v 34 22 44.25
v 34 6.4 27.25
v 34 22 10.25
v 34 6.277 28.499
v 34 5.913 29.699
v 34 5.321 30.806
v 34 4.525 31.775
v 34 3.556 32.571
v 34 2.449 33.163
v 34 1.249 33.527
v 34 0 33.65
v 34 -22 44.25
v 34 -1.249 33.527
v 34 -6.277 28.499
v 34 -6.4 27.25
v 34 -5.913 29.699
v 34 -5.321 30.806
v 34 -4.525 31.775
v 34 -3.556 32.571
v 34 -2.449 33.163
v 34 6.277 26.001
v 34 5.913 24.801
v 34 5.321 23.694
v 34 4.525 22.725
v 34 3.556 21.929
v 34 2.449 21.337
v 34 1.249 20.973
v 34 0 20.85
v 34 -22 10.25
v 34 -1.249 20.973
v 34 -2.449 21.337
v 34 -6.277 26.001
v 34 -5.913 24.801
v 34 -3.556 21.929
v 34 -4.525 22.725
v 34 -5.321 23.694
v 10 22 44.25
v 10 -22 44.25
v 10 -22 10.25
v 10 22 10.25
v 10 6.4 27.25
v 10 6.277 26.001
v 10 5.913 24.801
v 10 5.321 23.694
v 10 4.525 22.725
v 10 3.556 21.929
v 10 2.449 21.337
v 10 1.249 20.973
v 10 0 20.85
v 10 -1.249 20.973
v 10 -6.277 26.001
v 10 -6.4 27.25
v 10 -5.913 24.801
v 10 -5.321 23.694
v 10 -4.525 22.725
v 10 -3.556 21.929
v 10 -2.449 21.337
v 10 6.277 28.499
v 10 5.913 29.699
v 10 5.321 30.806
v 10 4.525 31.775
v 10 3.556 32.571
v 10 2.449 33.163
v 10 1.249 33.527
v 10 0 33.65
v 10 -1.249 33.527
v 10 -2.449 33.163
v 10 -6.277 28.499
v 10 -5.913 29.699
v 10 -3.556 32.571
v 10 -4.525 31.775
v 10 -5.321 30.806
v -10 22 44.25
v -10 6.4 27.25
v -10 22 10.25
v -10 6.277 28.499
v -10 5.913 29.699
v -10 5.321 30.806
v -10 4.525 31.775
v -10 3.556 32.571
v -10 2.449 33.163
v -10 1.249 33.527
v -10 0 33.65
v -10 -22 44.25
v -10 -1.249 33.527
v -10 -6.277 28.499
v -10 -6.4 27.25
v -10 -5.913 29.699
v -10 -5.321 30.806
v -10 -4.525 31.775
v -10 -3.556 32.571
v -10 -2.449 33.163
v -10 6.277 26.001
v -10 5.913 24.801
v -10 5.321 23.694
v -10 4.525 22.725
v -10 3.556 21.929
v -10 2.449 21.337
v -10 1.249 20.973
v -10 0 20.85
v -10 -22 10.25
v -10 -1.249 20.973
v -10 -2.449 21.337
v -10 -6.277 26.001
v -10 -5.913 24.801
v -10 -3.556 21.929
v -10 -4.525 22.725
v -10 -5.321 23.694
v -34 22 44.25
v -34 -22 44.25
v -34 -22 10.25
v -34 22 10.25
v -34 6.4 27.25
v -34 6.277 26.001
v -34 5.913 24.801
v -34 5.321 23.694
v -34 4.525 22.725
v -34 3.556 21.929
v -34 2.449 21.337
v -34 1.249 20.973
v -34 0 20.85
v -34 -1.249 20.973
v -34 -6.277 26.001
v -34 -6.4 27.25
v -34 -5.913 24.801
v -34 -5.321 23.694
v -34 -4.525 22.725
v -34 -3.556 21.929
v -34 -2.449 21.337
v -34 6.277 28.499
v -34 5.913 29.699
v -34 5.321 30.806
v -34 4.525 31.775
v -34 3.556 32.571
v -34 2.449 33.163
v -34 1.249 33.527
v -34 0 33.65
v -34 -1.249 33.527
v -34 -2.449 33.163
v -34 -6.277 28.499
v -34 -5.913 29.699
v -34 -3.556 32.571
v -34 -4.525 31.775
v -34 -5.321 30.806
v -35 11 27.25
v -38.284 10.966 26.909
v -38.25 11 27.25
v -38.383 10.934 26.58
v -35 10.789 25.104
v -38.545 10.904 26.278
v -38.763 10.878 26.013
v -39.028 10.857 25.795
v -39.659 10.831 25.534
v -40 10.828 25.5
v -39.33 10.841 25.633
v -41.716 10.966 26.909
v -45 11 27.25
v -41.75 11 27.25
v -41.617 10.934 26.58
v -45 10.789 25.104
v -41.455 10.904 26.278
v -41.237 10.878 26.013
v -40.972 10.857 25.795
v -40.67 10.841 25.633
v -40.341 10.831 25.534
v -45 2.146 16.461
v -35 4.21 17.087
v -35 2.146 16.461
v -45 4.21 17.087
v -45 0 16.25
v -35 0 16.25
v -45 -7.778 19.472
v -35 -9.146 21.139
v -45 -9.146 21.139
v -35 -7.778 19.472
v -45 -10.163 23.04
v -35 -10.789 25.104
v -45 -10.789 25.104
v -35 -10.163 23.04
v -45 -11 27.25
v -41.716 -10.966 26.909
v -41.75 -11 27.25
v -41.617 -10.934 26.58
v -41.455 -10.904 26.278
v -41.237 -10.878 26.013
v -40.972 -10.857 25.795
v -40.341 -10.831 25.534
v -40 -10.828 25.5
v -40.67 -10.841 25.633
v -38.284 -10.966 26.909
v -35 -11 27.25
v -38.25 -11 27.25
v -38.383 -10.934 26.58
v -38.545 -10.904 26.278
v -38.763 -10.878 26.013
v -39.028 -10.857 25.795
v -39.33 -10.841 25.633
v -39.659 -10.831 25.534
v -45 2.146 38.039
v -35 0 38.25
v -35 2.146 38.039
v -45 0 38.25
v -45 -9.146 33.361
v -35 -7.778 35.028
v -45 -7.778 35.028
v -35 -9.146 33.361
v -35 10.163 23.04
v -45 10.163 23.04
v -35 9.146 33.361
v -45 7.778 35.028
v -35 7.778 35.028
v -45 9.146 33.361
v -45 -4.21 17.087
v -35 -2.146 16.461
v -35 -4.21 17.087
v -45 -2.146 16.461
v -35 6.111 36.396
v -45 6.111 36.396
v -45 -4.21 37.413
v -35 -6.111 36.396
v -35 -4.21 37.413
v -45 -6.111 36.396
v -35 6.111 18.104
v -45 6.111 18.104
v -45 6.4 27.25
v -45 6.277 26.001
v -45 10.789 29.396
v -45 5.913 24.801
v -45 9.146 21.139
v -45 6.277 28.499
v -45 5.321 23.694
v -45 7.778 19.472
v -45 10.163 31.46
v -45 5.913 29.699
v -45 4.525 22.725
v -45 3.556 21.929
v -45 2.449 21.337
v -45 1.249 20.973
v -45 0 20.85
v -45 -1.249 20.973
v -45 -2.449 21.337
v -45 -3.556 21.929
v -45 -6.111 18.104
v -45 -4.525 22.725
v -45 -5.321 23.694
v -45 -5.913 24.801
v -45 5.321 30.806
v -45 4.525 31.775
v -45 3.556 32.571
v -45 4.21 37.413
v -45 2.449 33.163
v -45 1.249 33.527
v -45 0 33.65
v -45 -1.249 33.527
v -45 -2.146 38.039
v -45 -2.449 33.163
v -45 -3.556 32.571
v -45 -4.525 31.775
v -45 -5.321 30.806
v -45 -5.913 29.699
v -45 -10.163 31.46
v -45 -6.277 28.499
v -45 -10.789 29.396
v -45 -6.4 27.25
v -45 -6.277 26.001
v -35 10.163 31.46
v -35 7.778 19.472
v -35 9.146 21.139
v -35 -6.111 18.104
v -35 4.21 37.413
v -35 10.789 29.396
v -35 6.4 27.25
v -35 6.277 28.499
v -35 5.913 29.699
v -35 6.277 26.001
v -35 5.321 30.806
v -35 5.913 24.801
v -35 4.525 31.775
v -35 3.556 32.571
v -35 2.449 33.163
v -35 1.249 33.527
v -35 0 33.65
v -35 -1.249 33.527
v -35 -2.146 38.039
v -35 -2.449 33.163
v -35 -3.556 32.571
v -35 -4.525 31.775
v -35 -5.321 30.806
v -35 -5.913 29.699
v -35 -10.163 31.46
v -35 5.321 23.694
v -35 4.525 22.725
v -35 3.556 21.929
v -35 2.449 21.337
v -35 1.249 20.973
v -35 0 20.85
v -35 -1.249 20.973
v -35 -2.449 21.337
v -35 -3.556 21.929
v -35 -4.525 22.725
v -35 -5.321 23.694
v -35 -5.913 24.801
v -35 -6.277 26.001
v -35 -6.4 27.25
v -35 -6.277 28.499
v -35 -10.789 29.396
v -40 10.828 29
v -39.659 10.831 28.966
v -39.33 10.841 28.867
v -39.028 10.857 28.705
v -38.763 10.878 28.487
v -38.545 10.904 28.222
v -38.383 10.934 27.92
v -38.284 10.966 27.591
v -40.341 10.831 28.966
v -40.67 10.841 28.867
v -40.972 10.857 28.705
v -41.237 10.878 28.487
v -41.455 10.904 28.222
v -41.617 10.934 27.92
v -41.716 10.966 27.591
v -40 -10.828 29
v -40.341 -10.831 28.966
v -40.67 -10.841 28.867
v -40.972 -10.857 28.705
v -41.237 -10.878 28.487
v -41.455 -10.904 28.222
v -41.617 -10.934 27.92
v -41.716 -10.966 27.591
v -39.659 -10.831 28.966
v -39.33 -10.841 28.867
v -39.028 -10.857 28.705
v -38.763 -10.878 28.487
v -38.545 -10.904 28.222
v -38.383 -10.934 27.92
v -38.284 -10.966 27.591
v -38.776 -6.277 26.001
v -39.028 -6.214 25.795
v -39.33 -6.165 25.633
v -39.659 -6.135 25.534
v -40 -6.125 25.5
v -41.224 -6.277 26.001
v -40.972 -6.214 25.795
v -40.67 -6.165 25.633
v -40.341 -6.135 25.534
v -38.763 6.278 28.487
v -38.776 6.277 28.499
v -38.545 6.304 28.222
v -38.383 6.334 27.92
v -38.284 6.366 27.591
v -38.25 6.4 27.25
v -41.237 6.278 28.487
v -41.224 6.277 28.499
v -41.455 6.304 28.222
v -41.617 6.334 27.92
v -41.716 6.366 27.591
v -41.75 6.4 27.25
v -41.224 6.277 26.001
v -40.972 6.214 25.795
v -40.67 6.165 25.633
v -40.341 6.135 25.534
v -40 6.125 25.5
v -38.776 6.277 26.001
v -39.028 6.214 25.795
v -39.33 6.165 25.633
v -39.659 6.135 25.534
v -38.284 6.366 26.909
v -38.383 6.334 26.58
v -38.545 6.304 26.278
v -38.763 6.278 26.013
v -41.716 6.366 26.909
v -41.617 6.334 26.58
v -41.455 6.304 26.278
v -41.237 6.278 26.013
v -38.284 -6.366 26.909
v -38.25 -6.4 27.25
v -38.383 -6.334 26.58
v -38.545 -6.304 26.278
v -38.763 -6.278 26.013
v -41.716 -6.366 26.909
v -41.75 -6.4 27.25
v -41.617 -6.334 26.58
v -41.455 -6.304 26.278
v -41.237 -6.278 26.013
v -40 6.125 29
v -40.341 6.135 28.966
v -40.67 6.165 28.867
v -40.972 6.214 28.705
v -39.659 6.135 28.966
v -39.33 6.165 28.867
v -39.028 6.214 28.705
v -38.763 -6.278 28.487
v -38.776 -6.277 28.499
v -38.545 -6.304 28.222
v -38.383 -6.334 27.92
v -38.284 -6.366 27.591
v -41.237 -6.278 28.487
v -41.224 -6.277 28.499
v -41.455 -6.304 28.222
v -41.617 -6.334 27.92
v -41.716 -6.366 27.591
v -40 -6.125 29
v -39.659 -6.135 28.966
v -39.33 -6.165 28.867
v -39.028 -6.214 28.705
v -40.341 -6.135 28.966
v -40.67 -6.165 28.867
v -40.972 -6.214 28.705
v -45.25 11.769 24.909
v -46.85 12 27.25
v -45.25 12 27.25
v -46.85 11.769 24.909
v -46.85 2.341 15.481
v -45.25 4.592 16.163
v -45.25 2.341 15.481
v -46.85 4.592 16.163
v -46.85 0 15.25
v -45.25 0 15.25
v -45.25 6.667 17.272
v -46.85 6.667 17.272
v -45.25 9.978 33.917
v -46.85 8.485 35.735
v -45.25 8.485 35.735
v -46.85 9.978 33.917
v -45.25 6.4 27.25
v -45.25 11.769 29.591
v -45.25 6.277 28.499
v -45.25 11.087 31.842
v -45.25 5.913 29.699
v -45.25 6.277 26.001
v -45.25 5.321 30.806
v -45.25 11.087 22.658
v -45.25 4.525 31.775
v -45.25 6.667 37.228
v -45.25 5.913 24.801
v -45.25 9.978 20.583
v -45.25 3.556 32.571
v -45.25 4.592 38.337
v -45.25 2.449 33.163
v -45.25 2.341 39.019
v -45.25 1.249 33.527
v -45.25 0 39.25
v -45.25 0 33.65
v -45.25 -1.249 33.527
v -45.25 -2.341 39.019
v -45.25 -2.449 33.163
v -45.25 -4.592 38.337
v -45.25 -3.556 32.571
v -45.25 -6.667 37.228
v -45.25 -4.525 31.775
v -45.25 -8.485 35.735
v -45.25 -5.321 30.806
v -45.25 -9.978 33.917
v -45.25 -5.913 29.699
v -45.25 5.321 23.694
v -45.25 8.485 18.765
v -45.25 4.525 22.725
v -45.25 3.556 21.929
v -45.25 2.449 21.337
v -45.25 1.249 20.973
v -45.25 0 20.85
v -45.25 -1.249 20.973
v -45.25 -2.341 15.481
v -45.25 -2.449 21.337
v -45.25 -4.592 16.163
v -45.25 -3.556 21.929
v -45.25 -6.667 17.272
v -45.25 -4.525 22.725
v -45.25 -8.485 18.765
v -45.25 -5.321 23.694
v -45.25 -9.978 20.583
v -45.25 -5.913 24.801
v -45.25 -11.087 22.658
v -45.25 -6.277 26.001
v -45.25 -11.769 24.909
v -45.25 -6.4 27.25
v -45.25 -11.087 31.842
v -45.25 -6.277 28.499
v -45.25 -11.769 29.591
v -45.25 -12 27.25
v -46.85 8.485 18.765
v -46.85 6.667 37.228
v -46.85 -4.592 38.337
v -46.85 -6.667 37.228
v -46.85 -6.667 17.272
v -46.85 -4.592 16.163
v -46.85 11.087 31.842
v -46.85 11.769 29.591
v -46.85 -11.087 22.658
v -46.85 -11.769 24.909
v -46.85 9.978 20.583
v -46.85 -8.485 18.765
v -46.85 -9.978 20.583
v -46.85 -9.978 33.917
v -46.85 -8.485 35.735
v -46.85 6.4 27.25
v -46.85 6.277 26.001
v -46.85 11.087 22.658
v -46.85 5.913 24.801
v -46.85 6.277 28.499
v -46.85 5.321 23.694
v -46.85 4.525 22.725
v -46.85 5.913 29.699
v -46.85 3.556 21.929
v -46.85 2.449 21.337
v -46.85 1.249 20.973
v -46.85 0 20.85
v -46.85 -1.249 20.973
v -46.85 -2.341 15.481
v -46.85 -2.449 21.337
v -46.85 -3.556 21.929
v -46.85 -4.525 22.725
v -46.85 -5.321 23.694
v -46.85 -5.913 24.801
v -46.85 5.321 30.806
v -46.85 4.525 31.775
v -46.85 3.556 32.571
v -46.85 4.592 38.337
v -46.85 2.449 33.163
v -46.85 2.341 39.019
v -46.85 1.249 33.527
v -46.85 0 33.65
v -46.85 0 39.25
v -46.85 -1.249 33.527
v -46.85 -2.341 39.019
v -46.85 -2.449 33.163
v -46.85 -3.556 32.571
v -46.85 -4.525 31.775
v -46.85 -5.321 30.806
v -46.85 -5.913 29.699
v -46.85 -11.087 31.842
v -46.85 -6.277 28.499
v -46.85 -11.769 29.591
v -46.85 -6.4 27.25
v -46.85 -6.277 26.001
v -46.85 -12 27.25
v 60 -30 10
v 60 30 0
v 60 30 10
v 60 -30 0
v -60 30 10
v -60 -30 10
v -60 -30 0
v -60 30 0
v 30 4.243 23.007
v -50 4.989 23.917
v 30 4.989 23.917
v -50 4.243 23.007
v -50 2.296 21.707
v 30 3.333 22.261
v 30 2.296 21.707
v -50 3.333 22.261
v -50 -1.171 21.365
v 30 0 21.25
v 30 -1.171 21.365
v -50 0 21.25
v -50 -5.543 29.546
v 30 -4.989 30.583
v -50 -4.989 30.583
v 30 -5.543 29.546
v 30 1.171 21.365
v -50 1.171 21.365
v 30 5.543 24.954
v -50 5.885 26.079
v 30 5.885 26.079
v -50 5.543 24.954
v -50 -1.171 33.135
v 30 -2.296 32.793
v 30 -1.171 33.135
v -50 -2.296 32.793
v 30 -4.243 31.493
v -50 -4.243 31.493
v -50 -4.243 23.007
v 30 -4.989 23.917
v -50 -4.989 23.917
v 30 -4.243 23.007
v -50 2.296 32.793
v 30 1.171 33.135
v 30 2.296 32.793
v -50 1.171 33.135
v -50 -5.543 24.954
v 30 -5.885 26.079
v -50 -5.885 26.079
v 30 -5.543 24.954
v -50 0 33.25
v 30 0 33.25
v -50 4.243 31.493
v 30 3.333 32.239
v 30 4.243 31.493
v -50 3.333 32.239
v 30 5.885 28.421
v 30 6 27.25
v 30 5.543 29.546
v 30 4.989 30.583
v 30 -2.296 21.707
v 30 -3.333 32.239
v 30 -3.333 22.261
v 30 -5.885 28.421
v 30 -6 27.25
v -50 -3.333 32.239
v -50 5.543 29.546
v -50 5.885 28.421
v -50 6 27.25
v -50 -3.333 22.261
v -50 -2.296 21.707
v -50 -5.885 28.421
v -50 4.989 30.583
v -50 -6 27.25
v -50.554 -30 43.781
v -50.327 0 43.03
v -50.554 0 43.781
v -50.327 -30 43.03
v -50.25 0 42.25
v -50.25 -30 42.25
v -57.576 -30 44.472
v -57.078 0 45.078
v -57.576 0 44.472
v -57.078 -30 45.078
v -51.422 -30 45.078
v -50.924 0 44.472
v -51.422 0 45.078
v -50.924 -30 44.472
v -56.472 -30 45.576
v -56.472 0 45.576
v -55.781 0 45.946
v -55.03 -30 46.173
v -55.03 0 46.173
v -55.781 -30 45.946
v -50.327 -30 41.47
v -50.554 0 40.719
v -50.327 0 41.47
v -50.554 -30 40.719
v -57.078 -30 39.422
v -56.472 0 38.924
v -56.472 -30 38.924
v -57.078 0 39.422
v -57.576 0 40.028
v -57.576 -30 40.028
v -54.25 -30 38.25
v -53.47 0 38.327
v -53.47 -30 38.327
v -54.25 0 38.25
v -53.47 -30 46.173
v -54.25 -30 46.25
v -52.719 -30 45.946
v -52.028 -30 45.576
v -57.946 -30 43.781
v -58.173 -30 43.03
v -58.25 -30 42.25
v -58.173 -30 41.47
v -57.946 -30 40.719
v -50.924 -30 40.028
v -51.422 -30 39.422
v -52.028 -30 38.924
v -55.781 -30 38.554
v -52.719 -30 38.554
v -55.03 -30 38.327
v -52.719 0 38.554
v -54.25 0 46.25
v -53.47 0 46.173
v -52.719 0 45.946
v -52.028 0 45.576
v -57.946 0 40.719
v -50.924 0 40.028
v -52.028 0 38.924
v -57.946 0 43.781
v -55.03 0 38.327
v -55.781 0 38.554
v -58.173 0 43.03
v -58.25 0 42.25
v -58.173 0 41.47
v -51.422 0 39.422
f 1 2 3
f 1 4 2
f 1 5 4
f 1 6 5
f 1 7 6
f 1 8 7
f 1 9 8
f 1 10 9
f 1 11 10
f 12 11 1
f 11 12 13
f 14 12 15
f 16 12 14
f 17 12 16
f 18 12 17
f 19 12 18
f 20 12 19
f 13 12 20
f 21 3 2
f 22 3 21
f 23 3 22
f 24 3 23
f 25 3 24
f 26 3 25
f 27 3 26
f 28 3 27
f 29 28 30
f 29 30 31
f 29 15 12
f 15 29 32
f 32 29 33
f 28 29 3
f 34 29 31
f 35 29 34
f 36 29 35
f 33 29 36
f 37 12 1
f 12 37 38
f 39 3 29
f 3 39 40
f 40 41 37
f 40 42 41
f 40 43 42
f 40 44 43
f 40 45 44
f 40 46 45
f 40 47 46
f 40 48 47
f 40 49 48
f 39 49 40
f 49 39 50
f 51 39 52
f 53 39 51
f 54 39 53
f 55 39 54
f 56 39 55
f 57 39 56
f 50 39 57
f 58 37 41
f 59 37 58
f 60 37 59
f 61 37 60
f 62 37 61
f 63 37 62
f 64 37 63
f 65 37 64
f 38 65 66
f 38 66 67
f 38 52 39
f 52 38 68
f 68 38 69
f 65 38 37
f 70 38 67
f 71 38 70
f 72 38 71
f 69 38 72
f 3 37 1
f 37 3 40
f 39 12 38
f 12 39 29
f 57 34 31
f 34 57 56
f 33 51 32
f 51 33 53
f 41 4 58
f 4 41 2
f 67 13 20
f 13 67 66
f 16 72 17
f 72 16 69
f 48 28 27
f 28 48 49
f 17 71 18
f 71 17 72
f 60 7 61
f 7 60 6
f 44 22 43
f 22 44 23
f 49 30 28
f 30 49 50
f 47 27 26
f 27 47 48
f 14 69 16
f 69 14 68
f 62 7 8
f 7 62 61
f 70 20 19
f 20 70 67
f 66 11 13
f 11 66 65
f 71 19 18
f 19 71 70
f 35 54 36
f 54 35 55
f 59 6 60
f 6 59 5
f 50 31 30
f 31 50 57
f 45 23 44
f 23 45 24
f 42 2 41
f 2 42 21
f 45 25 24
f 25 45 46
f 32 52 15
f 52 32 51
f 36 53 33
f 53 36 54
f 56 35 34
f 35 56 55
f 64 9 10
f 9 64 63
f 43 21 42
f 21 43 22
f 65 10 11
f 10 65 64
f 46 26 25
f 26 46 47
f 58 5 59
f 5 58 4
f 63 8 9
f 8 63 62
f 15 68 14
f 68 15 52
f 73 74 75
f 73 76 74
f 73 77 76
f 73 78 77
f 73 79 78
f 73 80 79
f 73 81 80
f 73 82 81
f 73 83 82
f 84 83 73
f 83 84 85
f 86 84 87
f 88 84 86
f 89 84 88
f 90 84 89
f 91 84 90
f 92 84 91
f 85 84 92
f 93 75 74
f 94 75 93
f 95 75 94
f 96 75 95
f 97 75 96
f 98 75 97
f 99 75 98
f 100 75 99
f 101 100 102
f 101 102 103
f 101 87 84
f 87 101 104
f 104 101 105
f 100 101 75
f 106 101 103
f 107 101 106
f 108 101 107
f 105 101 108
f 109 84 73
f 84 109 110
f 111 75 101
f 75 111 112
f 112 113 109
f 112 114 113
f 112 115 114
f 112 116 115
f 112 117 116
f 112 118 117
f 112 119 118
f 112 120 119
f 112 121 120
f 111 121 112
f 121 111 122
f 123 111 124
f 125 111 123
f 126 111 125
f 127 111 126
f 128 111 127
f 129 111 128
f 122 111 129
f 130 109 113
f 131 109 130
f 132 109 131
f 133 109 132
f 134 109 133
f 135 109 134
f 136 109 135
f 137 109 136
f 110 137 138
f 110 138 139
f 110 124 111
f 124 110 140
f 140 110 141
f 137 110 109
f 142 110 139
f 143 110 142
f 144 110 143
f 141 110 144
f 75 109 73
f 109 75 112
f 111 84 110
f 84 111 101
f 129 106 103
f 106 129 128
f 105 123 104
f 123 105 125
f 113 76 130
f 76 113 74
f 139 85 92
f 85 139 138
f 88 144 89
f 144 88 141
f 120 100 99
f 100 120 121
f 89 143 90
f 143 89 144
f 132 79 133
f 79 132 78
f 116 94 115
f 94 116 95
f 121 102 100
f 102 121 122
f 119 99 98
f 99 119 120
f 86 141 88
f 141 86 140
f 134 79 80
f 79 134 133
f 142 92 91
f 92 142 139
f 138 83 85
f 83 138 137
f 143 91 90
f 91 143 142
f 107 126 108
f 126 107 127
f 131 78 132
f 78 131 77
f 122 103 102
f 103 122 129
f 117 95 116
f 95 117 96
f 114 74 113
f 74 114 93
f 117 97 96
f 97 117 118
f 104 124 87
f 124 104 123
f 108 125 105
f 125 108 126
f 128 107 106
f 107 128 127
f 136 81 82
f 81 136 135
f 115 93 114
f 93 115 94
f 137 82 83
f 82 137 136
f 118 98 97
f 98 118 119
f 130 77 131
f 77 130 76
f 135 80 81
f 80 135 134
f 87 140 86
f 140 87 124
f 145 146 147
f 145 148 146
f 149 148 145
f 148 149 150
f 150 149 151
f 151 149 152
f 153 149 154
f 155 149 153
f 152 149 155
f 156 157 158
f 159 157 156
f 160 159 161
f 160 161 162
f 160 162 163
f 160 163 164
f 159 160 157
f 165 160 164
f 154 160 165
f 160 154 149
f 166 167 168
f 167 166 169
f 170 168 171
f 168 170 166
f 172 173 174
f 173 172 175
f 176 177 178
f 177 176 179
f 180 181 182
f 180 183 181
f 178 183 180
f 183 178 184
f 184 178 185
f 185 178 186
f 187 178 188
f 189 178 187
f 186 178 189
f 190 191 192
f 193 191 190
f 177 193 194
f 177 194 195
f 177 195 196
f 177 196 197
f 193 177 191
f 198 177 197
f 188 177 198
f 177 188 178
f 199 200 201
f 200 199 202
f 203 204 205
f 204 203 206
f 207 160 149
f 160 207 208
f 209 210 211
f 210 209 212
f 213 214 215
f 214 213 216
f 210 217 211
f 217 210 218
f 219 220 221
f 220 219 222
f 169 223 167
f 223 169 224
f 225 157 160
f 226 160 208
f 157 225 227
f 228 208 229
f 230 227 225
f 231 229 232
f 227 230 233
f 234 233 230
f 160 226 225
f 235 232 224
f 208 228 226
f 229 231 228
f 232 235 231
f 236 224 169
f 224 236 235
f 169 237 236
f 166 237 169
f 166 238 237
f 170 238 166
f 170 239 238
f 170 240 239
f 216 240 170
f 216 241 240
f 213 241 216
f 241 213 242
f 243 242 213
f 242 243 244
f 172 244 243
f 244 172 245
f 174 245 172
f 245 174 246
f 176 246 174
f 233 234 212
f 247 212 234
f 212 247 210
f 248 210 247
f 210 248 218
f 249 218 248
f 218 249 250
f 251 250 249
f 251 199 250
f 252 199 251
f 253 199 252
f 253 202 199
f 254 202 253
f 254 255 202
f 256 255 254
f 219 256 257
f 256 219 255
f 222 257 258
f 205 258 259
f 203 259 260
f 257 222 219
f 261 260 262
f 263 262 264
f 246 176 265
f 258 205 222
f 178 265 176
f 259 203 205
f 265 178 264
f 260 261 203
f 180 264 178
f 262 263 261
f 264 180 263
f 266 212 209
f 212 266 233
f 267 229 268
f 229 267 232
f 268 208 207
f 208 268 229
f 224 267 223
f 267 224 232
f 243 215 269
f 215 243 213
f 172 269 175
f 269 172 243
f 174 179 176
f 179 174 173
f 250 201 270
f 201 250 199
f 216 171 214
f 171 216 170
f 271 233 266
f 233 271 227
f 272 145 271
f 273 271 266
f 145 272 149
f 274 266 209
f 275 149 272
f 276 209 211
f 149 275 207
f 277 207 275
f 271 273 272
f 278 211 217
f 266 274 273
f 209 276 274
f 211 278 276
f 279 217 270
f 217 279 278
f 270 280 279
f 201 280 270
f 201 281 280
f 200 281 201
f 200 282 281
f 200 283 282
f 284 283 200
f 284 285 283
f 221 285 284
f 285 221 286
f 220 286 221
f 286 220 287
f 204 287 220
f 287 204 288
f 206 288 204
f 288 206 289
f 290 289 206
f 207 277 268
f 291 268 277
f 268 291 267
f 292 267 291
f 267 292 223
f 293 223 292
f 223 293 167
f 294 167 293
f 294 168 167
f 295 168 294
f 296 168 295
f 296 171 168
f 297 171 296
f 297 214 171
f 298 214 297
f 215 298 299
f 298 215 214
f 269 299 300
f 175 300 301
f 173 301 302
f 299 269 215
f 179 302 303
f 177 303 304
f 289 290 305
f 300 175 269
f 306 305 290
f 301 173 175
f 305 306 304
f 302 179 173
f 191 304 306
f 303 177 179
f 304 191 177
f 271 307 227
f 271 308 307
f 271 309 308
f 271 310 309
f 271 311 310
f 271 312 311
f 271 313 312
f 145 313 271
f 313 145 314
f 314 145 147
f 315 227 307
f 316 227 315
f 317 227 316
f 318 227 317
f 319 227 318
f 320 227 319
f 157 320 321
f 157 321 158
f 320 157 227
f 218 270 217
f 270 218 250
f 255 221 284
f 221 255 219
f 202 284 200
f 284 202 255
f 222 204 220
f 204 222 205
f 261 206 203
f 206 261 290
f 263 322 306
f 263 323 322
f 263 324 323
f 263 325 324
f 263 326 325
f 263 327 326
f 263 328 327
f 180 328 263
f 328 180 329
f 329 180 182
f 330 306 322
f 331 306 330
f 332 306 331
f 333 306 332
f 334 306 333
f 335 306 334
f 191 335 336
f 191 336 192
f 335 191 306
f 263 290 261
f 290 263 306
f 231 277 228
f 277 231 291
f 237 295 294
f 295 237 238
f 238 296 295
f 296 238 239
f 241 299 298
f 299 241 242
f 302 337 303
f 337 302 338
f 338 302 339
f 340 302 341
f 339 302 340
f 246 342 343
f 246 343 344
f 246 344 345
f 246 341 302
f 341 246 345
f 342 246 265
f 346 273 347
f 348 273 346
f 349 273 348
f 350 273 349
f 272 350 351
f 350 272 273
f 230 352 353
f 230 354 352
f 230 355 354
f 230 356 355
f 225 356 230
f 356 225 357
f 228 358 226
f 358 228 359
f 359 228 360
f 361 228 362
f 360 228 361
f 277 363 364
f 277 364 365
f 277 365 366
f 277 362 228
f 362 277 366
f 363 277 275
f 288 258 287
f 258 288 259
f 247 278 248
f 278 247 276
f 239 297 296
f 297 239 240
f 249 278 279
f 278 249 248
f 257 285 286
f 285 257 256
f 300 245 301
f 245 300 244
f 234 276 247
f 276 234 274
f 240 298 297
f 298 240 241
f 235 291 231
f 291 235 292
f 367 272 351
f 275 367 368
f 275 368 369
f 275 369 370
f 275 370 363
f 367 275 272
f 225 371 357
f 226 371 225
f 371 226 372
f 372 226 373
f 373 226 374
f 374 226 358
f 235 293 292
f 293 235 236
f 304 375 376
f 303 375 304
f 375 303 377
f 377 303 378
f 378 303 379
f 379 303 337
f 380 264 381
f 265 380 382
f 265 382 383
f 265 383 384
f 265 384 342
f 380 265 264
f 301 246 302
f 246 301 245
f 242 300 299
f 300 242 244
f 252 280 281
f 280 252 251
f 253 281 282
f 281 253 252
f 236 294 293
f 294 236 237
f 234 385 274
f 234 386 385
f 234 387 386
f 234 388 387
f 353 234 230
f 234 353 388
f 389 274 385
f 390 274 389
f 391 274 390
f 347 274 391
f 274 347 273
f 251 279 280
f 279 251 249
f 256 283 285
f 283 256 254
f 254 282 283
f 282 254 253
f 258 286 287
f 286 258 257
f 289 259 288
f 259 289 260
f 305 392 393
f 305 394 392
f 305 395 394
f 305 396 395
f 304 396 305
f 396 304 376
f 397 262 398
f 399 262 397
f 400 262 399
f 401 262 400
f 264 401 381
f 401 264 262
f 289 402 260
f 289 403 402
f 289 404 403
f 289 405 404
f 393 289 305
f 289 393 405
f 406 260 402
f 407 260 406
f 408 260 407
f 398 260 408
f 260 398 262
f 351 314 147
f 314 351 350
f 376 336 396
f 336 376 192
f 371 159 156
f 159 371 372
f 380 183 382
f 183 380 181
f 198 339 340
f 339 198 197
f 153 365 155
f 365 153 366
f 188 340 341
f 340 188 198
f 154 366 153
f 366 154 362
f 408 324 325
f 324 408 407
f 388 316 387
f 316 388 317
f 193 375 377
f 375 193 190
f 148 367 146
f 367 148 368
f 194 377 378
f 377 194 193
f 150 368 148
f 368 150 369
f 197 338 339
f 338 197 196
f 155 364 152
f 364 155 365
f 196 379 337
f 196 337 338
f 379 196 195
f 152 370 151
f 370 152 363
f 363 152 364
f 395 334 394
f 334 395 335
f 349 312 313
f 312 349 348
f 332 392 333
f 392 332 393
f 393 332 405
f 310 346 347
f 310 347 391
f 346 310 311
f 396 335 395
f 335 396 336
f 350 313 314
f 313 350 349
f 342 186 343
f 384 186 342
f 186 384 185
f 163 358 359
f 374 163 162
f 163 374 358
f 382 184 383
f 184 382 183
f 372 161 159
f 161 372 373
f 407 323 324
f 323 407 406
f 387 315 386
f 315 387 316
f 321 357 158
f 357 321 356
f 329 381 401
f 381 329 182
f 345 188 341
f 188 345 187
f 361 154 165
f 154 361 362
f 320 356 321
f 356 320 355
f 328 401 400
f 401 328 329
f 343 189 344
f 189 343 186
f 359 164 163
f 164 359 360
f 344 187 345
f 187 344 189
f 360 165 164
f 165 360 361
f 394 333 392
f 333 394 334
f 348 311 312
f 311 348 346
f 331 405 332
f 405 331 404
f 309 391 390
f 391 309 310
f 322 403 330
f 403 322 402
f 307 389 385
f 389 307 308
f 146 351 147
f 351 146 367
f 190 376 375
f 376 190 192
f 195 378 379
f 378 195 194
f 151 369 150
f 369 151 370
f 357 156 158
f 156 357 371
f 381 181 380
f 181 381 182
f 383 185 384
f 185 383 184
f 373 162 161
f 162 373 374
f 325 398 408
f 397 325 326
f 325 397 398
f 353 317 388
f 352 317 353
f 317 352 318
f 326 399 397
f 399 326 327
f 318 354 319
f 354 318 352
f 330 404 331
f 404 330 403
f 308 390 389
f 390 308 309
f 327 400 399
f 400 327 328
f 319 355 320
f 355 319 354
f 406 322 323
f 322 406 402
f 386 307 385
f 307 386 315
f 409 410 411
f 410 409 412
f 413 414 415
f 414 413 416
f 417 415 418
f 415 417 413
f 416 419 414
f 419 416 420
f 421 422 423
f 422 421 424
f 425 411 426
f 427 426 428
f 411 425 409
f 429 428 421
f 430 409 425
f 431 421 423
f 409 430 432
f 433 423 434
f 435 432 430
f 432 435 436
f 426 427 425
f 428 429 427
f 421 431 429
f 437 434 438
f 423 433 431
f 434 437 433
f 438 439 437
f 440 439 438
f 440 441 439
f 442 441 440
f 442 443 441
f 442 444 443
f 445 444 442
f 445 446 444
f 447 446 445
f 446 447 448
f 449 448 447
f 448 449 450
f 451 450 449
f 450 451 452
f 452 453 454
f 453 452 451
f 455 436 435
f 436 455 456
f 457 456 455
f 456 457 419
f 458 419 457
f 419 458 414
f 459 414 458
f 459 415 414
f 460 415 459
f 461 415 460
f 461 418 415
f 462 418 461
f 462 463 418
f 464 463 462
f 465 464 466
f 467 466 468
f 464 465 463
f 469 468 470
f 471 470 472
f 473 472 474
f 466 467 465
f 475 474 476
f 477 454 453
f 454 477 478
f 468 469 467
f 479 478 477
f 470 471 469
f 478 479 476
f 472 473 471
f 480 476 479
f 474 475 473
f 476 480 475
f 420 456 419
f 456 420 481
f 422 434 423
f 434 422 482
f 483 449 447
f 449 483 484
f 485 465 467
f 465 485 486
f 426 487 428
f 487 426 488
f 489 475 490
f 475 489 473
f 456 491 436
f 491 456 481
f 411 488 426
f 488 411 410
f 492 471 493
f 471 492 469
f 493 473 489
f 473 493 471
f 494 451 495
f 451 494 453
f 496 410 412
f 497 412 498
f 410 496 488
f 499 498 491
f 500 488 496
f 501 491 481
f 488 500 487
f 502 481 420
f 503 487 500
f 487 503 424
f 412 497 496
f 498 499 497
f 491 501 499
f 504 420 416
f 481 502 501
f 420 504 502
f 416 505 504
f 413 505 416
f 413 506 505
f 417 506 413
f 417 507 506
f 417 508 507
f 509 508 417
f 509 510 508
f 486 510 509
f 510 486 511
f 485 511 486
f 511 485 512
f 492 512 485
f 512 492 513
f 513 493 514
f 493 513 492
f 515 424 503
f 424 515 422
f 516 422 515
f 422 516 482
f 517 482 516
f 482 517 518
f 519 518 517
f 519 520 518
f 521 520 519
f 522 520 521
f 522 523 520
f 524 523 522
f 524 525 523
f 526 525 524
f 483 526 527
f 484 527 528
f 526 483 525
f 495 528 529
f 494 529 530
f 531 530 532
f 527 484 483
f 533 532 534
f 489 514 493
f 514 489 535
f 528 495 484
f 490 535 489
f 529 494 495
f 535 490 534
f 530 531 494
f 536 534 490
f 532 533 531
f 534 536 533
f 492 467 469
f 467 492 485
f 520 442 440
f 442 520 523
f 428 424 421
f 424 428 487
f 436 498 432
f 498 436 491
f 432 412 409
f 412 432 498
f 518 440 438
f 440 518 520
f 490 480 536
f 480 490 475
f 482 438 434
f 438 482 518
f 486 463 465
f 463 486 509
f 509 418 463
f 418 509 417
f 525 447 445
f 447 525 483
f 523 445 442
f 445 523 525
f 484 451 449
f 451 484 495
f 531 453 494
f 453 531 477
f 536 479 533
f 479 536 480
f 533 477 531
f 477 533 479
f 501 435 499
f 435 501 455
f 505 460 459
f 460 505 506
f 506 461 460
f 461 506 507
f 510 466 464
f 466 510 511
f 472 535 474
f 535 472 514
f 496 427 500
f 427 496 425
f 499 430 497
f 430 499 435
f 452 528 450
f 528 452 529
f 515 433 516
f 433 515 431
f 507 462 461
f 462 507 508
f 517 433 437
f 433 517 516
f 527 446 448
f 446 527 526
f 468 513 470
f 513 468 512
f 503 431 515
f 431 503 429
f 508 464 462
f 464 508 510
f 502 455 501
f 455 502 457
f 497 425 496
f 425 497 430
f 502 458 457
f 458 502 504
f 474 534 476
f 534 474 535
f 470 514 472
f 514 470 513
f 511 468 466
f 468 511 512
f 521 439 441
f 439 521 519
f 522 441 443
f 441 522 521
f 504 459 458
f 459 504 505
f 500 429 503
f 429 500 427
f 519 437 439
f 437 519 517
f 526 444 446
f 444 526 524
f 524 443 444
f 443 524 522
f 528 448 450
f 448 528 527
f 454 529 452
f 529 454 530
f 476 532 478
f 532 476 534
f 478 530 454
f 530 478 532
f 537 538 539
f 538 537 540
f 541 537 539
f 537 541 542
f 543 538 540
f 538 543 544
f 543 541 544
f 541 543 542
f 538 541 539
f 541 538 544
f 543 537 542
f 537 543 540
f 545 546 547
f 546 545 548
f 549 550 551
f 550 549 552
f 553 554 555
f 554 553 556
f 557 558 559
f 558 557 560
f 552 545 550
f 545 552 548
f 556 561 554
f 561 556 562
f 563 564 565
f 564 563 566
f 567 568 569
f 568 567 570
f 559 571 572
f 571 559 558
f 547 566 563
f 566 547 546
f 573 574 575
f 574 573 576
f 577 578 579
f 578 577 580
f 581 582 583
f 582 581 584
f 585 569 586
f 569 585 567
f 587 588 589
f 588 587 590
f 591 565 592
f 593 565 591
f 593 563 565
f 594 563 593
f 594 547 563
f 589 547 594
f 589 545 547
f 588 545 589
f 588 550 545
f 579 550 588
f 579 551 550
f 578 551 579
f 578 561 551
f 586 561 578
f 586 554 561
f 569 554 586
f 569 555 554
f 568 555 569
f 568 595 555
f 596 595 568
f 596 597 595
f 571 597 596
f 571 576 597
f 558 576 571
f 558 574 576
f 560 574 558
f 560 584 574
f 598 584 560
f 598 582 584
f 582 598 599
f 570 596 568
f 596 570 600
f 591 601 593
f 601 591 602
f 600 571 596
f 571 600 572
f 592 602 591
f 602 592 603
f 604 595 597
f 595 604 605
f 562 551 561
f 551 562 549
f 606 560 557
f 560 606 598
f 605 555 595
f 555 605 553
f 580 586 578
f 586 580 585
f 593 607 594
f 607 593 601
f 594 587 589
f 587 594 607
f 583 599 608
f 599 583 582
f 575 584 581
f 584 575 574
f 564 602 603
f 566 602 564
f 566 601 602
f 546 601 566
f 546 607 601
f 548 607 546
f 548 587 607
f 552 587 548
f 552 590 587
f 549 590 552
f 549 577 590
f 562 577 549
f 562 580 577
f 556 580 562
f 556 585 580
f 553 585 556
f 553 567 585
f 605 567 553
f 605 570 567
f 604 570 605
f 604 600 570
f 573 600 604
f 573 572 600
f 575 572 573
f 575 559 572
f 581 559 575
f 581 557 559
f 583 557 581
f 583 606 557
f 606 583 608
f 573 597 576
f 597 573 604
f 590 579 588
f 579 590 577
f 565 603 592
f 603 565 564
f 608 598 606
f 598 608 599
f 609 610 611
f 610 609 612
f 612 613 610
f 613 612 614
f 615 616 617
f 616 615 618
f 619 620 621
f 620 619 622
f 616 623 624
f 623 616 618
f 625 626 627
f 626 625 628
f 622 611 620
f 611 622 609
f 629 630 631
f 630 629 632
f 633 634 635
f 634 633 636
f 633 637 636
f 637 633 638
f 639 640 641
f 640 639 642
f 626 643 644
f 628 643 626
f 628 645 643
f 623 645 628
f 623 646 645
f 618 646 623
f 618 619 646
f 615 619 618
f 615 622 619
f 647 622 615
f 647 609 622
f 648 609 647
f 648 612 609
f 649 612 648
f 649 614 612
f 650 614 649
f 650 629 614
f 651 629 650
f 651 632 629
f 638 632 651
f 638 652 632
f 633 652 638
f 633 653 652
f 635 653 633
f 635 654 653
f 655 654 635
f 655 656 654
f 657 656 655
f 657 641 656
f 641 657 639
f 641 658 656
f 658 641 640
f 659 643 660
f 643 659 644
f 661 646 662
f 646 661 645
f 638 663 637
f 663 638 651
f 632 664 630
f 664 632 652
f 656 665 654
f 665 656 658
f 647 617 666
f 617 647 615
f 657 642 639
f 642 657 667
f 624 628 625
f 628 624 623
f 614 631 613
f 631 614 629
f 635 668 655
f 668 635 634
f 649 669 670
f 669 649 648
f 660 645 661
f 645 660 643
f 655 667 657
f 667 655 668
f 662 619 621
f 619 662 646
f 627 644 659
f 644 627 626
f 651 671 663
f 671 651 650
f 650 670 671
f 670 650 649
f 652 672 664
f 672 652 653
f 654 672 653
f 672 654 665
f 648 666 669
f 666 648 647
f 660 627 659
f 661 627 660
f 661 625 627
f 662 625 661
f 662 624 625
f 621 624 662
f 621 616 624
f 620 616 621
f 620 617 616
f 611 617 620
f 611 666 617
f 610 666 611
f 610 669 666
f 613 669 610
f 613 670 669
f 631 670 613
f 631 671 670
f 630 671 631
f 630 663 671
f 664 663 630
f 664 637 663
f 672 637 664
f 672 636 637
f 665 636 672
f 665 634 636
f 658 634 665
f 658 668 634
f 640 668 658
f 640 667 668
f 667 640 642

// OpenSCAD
$fn = 32;

// ------------------------------------------------------------------------
// Machine vise: screw d12, jaws 24 x 34 mm
// Every part is its own module, assembly() places every instance.
// ------------------------------------------------------------------------

// --- part 1 ---
module vise_bed() {
  difference() {
    translate([-60, -30, 0]) cube([120, 60, 10]);
  }
}

// --- part 2 ---
module vise_jaw() {
  difference() {
    translate([-12, -22, 0]) cube([24, 44, 34]);
    translate([0, 0, 17]) rotate([0, 90, 0]) cylinder(h = 26, d = 12.8, center = true);
  }
}

// --- part 3 ---
module vise_screw() {
  translate([0, 0, -40]) cylinder(h = 80, d = 12);
}

// --- part 4 ---
module screw_collar() {
  difference() {
    cylinder(h = 10, d = 22);
    translate([0, 0, -1]) cylinder(h = 12, d = 12.8);
    translate([0, 0, 5]) rotate([90, 0, 0]) cylinder(h = 24, d = 3.5, center = true);
  }
}

// --- part 5 ---
module screw_washer() {
  difference() {
      translate([0, 0, 0]) cylinder(h = 1.6, d = 24);
      translate([0, 0, -1]) cylinder(h = 3.6, d = 12.8);
    }
}

// --- part 6 ---
module vise_handle() {
  cylinder(h = 30, d = 8);
}

// --- assembly ---
module assembly() {
  color([0.80, 0.24, 0.20]) translate([0, 0, 0]) rotate([0, 0, 0]) vise_bed();
  color([0.20, 0.45, 0.75]) translate([22, 0, 10.25]) rotate([0, 0, 0]) vise_jaw();
  color([0.25, 0.62, 0.32]) translate([-22, 0, 10.25]) rotate([0, 0, 0]) vise_jaw();
  color([0.92, 0.70, 0.18]) translate([-10, 0, 27.25]) rotate([0, 90, 0]) vise_screw();
  color([0.58, 0.35, 0.70]) translate([-45, 0, 27.25]) rotate([0, 90, 0]) screw_collar();
  color([0.16, 0.66, 0.66]) translate([-46.85, 0, 27.25]) rotate([0, 90, 0]) screw_washer();
  color([0.85, 0.48, 0.18]) translate([-54.25, 0, 42.25]) rotate([90, 0, 0]) vise_handle();
}

assembly();
